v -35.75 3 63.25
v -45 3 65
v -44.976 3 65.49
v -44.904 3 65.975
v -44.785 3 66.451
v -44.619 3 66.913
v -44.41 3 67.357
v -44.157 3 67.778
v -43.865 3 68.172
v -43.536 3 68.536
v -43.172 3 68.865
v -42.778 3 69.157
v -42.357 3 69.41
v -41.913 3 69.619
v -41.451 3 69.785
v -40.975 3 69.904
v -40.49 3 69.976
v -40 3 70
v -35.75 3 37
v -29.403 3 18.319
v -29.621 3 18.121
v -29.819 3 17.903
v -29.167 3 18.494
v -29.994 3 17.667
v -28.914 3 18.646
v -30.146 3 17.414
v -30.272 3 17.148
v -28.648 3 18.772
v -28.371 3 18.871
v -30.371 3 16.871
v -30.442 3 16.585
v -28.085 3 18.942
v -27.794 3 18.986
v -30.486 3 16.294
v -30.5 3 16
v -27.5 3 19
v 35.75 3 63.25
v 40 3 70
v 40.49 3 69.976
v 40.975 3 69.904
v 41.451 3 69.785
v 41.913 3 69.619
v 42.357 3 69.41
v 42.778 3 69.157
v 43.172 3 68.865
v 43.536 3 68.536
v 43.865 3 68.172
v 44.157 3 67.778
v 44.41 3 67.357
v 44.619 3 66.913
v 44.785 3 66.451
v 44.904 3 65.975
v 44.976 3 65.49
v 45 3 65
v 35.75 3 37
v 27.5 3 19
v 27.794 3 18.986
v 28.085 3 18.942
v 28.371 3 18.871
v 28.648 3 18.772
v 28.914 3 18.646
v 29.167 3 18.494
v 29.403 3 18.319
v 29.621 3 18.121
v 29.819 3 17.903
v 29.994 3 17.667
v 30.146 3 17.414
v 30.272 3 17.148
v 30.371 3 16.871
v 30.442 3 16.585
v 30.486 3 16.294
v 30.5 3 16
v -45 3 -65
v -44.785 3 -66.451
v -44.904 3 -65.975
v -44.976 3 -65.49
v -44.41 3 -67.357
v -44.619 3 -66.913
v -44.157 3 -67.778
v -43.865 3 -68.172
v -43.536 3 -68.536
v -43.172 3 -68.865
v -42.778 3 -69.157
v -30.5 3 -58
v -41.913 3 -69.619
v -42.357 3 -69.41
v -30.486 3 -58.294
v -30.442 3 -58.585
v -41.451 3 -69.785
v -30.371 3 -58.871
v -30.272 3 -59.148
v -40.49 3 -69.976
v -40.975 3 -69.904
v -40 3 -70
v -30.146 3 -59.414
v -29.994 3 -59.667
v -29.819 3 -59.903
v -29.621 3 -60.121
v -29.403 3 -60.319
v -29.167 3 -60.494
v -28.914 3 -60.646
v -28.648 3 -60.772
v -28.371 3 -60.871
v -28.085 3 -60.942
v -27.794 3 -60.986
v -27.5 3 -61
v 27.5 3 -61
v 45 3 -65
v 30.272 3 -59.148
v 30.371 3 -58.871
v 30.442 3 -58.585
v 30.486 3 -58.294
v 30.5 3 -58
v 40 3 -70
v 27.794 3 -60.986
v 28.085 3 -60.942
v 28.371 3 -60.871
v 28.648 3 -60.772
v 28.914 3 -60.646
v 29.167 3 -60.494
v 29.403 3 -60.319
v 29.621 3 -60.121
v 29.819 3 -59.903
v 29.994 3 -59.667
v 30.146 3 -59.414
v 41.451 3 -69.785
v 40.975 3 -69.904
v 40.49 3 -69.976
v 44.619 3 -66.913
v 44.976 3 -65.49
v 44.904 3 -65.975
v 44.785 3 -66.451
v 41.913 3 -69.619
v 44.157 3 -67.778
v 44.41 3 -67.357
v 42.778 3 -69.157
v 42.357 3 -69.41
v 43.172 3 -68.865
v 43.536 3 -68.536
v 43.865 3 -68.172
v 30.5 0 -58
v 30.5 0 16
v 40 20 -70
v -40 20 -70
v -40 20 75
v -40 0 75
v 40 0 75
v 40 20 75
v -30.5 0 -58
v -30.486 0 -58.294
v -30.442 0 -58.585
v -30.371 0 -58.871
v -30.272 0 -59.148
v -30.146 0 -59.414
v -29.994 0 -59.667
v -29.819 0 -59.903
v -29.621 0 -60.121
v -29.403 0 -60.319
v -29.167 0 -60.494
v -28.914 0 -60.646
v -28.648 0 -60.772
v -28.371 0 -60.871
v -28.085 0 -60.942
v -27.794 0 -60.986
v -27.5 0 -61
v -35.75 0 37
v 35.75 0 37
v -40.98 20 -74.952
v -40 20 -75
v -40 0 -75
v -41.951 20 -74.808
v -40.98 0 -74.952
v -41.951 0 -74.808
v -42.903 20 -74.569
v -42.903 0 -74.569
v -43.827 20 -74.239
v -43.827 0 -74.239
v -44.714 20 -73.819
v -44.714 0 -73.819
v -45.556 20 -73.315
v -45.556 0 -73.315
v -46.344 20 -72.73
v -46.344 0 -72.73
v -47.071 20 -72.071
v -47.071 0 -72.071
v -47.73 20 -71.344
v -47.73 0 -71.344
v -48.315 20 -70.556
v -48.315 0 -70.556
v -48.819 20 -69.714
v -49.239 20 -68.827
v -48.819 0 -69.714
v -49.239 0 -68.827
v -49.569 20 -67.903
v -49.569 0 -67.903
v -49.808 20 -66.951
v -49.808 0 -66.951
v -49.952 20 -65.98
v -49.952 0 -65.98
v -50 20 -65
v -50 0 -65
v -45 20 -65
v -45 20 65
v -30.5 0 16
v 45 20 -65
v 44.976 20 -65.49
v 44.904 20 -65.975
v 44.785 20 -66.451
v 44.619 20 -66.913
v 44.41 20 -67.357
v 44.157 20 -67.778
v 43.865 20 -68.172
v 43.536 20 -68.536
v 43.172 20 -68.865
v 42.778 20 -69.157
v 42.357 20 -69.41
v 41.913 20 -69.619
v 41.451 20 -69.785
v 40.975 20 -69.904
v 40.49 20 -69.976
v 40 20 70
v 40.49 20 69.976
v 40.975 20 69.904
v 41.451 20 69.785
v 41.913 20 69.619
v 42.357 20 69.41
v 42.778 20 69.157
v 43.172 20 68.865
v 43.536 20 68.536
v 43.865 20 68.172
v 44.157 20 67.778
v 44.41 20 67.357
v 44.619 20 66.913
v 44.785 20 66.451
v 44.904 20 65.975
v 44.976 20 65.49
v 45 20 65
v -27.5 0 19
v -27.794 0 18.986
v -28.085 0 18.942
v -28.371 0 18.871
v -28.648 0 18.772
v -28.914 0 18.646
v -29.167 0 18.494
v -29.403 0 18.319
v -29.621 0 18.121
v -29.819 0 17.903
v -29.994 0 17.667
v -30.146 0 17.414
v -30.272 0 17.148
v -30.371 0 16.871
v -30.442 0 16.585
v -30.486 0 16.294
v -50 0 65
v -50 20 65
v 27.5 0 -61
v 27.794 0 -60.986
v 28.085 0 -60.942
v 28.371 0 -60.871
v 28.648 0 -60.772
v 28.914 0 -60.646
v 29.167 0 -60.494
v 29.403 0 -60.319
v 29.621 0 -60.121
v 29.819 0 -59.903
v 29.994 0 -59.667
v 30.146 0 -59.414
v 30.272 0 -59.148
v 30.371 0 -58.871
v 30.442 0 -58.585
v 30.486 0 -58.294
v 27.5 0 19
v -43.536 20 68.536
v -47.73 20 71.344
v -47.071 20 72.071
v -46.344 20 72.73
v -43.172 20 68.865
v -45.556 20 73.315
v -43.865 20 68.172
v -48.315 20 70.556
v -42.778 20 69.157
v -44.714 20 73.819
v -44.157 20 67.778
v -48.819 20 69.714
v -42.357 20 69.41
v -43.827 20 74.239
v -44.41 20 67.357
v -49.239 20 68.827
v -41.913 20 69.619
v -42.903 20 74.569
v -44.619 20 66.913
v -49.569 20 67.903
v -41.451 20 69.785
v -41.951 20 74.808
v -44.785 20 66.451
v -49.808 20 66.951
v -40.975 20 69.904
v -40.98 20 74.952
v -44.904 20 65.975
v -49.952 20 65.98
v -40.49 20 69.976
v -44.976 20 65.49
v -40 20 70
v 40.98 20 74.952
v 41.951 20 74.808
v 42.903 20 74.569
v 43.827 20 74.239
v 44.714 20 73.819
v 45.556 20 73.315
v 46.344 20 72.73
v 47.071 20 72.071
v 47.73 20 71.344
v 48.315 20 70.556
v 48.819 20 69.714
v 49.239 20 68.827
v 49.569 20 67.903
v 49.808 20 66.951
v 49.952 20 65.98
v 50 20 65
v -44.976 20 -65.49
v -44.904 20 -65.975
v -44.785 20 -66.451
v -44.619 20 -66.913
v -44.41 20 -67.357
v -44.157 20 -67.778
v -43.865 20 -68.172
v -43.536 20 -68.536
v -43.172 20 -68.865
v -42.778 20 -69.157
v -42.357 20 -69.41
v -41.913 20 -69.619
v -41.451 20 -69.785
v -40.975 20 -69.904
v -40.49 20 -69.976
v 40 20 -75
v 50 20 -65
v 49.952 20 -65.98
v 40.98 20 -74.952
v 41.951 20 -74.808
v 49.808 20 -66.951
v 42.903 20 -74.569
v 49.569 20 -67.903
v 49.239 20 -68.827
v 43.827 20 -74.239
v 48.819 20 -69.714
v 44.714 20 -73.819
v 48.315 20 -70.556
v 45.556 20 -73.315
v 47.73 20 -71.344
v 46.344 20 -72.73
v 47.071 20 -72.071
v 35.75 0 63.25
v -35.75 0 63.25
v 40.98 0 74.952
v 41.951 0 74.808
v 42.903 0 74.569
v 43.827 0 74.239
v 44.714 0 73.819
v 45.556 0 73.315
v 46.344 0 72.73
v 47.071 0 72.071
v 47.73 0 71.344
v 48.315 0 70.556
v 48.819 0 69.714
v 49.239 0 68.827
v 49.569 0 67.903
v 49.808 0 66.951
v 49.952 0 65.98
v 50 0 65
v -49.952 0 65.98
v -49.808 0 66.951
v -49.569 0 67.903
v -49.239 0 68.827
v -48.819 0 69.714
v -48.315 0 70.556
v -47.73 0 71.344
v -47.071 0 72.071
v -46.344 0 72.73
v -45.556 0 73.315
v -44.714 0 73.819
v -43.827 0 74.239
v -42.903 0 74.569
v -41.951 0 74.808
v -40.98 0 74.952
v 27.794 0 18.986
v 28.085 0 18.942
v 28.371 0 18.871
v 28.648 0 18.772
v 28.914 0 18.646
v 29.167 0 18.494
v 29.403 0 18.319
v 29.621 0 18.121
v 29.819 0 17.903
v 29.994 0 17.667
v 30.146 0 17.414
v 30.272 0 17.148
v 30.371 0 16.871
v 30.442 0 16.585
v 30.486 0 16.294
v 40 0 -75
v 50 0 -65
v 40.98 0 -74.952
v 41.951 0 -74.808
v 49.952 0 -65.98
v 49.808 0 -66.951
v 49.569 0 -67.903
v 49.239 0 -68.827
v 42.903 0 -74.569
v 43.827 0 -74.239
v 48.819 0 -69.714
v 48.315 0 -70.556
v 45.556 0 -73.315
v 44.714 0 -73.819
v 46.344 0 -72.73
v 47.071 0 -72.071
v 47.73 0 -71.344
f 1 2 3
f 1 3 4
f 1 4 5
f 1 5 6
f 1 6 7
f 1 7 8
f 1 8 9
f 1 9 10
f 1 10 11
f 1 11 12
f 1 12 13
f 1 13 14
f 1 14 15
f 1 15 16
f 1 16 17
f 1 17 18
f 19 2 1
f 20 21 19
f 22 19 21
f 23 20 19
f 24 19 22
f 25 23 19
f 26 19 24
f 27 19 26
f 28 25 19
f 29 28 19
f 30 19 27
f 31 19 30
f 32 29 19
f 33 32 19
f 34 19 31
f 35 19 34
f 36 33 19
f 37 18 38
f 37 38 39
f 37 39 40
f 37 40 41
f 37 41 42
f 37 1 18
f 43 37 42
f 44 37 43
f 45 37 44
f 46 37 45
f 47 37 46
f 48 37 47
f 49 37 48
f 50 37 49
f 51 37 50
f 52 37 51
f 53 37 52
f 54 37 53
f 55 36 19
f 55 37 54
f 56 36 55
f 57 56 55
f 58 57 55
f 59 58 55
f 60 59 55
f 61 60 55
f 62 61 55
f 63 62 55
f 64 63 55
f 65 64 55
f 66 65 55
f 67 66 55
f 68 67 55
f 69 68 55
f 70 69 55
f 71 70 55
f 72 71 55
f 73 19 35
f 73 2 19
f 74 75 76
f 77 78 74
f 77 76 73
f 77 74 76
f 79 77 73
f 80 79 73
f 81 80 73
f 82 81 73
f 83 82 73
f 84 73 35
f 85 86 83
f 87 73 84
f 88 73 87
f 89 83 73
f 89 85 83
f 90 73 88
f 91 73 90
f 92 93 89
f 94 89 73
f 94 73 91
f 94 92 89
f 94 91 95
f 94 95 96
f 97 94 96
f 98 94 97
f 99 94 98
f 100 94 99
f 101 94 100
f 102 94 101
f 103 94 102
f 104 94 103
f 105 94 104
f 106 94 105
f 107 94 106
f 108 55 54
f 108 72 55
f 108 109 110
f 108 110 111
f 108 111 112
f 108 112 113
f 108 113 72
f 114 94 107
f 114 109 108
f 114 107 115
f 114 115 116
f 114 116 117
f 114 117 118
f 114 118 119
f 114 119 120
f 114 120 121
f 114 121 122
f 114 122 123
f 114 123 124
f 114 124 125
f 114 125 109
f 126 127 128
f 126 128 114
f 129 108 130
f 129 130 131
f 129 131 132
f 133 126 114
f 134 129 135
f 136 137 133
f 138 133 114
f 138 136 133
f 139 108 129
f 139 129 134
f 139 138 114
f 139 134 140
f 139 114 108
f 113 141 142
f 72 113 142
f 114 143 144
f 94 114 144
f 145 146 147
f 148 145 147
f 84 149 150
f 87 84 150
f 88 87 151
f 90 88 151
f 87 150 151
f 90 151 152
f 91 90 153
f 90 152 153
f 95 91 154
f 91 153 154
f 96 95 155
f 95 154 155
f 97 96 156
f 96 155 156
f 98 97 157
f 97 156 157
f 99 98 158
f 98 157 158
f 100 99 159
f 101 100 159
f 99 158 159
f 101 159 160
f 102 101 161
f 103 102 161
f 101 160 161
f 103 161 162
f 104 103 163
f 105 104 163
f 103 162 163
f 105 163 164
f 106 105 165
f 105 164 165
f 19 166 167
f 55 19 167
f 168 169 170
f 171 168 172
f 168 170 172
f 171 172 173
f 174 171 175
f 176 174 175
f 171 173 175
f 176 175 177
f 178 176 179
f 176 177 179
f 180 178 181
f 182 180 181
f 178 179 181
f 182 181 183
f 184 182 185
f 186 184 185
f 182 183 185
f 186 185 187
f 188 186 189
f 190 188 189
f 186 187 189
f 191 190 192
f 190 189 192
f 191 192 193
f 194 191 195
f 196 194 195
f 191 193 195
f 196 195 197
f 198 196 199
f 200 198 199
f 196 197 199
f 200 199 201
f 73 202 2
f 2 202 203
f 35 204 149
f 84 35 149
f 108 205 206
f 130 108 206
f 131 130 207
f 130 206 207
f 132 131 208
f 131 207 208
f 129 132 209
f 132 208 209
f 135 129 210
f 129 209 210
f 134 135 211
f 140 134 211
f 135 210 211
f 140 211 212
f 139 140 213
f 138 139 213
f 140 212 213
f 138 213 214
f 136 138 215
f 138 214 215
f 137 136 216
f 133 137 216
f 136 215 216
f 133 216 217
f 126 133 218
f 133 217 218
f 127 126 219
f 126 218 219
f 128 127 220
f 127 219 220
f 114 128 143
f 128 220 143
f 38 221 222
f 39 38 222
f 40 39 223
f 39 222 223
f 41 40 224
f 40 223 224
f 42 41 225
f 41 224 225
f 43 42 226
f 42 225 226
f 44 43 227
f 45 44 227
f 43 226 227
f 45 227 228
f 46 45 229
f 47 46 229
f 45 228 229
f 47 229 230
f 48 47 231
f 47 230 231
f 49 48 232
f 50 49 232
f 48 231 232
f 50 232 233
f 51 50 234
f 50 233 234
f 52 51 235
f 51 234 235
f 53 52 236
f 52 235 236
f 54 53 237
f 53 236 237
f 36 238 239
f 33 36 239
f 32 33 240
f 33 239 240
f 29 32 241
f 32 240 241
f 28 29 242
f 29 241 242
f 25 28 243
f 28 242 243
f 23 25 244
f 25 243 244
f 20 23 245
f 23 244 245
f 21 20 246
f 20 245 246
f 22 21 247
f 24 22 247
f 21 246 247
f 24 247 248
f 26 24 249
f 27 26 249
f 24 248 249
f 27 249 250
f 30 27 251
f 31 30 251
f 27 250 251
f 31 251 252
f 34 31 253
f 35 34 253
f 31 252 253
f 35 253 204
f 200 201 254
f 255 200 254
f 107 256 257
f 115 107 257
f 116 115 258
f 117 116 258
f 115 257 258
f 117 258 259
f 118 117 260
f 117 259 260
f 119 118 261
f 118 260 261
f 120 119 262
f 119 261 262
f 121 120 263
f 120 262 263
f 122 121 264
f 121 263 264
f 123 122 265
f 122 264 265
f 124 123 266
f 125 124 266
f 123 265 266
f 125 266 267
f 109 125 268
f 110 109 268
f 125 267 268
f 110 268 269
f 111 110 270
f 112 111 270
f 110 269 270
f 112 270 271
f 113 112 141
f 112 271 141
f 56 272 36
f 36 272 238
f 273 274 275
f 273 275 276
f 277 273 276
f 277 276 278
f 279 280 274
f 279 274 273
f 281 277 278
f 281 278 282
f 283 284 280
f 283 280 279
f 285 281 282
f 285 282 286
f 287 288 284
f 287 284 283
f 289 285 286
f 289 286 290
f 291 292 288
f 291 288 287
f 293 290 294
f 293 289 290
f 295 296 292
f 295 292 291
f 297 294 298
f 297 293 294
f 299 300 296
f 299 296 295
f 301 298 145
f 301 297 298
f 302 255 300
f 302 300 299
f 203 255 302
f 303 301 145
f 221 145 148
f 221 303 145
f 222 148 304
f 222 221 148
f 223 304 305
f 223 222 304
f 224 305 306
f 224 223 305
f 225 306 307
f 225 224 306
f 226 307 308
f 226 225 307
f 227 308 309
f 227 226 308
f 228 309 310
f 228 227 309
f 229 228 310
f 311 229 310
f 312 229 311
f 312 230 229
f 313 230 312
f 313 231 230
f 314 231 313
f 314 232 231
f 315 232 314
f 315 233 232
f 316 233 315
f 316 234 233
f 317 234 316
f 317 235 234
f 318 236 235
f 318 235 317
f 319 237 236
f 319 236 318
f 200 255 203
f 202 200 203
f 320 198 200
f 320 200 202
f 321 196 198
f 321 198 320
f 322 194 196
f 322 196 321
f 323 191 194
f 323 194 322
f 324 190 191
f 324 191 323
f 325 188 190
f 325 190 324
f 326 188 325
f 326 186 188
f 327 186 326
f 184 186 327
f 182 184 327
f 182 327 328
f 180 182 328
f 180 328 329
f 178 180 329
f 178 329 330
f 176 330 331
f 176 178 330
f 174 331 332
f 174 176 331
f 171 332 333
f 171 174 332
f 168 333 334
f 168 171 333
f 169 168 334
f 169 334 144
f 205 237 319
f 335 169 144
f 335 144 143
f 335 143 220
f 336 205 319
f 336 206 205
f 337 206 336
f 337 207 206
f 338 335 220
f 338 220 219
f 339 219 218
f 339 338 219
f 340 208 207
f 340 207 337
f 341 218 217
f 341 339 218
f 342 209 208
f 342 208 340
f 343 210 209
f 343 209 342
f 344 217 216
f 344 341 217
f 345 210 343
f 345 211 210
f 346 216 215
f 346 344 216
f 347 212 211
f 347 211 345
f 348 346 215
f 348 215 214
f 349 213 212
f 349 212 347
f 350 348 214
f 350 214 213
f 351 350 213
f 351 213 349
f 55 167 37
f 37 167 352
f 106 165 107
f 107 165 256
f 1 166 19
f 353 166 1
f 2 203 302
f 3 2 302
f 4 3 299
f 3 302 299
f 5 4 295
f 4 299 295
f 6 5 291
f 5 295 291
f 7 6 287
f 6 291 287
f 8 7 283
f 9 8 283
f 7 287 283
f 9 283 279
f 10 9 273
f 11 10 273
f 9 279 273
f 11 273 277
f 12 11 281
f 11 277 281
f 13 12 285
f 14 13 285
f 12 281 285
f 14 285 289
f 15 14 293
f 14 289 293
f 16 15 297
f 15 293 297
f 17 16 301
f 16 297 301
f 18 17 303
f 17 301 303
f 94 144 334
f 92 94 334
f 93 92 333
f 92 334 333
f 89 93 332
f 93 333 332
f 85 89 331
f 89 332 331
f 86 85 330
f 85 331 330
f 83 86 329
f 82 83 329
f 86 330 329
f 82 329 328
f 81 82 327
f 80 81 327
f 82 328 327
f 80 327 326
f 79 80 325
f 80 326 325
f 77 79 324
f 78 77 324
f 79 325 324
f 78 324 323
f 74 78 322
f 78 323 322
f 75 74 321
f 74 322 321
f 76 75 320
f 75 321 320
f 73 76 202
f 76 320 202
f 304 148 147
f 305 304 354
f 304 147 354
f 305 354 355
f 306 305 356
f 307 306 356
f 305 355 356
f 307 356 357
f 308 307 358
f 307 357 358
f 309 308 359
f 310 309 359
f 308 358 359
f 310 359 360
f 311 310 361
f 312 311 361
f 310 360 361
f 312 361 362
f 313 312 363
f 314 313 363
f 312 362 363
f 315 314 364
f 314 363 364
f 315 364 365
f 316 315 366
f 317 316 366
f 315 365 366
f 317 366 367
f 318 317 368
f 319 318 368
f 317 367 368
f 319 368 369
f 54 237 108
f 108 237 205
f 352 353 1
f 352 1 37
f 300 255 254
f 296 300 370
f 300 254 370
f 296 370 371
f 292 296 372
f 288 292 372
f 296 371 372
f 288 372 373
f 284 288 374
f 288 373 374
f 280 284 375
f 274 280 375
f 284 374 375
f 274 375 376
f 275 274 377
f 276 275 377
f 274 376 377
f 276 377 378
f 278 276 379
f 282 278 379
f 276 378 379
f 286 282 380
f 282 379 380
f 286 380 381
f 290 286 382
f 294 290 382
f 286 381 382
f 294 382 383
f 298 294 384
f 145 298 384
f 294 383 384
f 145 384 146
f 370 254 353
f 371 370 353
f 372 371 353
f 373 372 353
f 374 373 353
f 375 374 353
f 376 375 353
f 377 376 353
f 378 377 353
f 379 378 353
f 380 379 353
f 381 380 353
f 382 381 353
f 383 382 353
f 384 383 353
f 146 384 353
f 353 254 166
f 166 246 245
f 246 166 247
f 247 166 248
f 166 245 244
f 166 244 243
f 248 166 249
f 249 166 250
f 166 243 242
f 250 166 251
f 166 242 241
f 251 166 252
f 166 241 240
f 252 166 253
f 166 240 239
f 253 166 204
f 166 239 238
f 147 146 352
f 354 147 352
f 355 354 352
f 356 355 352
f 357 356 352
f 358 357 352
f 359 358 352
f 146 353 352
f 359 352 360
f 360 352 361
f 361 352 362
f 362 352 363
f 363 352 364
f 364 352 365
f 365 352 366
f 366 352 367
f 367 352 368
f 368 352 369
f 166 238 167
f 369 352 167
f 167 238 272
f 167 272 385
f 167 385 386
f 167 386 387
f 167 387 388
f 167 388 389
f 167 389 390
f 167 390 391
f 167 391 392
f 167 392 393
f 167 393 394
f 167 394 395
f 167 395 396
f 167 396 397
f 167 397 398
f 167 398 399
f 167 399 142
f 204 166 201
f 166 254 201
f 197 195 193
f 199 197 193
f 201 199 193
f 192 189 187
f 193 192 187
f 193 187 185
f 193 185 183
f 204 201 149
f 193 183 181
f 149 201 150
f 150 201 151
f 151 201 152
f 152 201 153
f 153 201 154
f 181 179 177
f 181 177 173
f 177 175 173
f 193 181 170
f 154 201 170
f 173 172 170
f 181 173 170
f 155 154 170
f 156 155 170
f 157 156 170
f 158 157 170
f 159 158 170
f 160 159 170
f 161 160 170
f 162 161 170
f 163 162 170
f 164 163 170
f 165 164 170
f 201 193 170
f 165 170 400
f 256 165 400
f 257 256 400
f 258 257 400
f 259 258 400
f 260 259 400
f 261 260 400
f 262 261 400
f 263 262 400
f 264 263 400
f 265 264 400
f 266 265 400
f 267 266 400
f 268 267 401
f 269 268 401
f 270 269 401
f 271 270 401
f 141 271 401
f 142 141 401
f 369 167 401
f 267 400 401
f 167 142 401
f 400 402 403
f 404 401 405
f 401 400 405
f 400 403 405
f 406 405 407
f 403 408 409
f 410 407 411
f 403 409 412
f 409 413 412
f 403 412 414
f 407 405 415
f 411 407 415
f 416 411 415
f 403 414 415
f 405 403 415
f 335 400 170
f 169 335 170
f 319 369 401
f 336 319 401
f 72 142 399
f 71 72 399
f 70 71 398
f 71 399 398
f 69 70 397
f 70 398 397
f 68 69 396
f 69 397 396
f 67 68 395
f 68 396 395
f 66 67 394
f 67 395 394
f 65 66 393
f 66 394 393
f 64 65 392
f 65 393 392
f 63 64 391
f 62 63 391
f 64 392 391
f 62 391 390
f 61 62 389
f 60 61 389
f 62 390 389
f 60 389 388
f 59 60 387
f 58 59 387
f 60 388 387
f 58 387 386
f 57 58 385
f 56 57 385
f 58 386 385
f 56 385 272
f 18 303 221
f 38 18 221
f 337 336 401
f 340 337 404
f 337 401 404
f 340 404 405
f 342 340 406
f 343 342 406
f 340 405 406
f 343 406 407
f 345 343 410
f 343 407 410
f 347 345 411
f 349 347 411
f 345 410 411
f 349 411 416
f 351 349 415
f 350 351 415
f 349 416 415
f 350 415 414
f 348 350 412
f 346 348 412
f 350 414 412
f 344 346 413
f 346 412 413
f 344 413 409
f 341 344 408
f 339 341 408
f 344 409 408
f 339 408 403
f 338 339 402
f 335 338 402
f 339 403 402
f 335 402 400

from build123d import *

# Parameters (mm, degrees)
BOSS_EXTRUDE1_DEPTH = 20
CUT_EXTRUDE1_DEPTH  = 17
SKETCH4_W           = 71.5
SKETCH4_H           = 26.25
CUT_EXTRUDE2_DEPTH  = 93.330926563


with BuildPart() as part:
    # Sketch1 → Boss-Extrude1 (new body)
    with BuildSketch(Plane(origin=(0, 0, 0), x_dir=(1, 0, 0), z_dir=(0, 1, 0))):
        with BuildLine():
            Line((-40, -75), (40, -75))
            ThreePointArc((40, -75), (47.071067812, -72.071067812), (50, -65))
            Line((50, -65), (50, 65))
            ThreePointArc((50, 65), (47.071067812, 72.071067812), (40, 75))
            Line((40, 75), (-40, 75))
            ThreePointArc((-40, 75), (-47.071067812, 72.071067812), (-50, 65))
            Line((-50, 65), (-50, -65))
            ThreePointArc((-50, -65), (-47.071067812, -72.071067812), (-40, -75))
        make_face()
    extrude(amount=BOSS_EXTRUDE1_DEPTH)

    # Sketch3 → Cut-Extrude1 (cut)
    with BuildSketch(Plane(origin=(0, 20, 0), x_dir=(1, 0, 0), z_dir=(0, 1, 0))):
        with BuildLine():
            Line((40, 70), (-40, 70))
            ThreePointArc((-40, 70), (-43.535533906, 68.535533906), (-45, 65))
            Line((-45, 65), (-45, -65))
            ThreePointArc((-45, -65), (-43.535533906, -68.535533906), (-40, -70))
            Line((-40, -70), (40, -70))
            ThreePointArc((40, -70), (43.535533906, -68.535533906), (45, -65))
            Line((45, -65), (45, 65))
            ThreePointArc((45, 65), (43.535533906, 68.535533906), (40, 70))
        make_face()
    extrude(amount=-CUT_EXTRUDE1_DEPTH, mode=Mode.SUBTRACT)

    # Sketch4 → Cut-Extrude2 (cut, through all)
    with BuildSketch(Plane.XZ):
        with BuildLine():
            Line((-27.5, -61), (27.5, -61))
            ThreePointArc((27.5, -61), (29.621320344, -60.121320344), (30.5, -58))
            Line((30.5, -58), (30.5, 16))
            ThreePointArc((30.5, 16), (29.621320344, 18.121320344), (27.5, 19))
            Line((27.5, 19), (-27.5, 19))
            ThreePointArc((-27.5, 19), (-29.621320344, 18.121320344), (-30.5, 16))
            Line((-30.5, 16), (-30.5, -58))
            ThreePointArc((-30.5, -58), (-29.621320344, -60.121320344), (-27.5, -61))
        make_face()
        with Locations((0, 50.125)):
            Rectangle(SKETCH4_W, SKETCH4_H)
    extrude(amount=-CUT_EXTRUDE2_DEPTH, mode=Mode.SUBTRACT)


solid = part.part
